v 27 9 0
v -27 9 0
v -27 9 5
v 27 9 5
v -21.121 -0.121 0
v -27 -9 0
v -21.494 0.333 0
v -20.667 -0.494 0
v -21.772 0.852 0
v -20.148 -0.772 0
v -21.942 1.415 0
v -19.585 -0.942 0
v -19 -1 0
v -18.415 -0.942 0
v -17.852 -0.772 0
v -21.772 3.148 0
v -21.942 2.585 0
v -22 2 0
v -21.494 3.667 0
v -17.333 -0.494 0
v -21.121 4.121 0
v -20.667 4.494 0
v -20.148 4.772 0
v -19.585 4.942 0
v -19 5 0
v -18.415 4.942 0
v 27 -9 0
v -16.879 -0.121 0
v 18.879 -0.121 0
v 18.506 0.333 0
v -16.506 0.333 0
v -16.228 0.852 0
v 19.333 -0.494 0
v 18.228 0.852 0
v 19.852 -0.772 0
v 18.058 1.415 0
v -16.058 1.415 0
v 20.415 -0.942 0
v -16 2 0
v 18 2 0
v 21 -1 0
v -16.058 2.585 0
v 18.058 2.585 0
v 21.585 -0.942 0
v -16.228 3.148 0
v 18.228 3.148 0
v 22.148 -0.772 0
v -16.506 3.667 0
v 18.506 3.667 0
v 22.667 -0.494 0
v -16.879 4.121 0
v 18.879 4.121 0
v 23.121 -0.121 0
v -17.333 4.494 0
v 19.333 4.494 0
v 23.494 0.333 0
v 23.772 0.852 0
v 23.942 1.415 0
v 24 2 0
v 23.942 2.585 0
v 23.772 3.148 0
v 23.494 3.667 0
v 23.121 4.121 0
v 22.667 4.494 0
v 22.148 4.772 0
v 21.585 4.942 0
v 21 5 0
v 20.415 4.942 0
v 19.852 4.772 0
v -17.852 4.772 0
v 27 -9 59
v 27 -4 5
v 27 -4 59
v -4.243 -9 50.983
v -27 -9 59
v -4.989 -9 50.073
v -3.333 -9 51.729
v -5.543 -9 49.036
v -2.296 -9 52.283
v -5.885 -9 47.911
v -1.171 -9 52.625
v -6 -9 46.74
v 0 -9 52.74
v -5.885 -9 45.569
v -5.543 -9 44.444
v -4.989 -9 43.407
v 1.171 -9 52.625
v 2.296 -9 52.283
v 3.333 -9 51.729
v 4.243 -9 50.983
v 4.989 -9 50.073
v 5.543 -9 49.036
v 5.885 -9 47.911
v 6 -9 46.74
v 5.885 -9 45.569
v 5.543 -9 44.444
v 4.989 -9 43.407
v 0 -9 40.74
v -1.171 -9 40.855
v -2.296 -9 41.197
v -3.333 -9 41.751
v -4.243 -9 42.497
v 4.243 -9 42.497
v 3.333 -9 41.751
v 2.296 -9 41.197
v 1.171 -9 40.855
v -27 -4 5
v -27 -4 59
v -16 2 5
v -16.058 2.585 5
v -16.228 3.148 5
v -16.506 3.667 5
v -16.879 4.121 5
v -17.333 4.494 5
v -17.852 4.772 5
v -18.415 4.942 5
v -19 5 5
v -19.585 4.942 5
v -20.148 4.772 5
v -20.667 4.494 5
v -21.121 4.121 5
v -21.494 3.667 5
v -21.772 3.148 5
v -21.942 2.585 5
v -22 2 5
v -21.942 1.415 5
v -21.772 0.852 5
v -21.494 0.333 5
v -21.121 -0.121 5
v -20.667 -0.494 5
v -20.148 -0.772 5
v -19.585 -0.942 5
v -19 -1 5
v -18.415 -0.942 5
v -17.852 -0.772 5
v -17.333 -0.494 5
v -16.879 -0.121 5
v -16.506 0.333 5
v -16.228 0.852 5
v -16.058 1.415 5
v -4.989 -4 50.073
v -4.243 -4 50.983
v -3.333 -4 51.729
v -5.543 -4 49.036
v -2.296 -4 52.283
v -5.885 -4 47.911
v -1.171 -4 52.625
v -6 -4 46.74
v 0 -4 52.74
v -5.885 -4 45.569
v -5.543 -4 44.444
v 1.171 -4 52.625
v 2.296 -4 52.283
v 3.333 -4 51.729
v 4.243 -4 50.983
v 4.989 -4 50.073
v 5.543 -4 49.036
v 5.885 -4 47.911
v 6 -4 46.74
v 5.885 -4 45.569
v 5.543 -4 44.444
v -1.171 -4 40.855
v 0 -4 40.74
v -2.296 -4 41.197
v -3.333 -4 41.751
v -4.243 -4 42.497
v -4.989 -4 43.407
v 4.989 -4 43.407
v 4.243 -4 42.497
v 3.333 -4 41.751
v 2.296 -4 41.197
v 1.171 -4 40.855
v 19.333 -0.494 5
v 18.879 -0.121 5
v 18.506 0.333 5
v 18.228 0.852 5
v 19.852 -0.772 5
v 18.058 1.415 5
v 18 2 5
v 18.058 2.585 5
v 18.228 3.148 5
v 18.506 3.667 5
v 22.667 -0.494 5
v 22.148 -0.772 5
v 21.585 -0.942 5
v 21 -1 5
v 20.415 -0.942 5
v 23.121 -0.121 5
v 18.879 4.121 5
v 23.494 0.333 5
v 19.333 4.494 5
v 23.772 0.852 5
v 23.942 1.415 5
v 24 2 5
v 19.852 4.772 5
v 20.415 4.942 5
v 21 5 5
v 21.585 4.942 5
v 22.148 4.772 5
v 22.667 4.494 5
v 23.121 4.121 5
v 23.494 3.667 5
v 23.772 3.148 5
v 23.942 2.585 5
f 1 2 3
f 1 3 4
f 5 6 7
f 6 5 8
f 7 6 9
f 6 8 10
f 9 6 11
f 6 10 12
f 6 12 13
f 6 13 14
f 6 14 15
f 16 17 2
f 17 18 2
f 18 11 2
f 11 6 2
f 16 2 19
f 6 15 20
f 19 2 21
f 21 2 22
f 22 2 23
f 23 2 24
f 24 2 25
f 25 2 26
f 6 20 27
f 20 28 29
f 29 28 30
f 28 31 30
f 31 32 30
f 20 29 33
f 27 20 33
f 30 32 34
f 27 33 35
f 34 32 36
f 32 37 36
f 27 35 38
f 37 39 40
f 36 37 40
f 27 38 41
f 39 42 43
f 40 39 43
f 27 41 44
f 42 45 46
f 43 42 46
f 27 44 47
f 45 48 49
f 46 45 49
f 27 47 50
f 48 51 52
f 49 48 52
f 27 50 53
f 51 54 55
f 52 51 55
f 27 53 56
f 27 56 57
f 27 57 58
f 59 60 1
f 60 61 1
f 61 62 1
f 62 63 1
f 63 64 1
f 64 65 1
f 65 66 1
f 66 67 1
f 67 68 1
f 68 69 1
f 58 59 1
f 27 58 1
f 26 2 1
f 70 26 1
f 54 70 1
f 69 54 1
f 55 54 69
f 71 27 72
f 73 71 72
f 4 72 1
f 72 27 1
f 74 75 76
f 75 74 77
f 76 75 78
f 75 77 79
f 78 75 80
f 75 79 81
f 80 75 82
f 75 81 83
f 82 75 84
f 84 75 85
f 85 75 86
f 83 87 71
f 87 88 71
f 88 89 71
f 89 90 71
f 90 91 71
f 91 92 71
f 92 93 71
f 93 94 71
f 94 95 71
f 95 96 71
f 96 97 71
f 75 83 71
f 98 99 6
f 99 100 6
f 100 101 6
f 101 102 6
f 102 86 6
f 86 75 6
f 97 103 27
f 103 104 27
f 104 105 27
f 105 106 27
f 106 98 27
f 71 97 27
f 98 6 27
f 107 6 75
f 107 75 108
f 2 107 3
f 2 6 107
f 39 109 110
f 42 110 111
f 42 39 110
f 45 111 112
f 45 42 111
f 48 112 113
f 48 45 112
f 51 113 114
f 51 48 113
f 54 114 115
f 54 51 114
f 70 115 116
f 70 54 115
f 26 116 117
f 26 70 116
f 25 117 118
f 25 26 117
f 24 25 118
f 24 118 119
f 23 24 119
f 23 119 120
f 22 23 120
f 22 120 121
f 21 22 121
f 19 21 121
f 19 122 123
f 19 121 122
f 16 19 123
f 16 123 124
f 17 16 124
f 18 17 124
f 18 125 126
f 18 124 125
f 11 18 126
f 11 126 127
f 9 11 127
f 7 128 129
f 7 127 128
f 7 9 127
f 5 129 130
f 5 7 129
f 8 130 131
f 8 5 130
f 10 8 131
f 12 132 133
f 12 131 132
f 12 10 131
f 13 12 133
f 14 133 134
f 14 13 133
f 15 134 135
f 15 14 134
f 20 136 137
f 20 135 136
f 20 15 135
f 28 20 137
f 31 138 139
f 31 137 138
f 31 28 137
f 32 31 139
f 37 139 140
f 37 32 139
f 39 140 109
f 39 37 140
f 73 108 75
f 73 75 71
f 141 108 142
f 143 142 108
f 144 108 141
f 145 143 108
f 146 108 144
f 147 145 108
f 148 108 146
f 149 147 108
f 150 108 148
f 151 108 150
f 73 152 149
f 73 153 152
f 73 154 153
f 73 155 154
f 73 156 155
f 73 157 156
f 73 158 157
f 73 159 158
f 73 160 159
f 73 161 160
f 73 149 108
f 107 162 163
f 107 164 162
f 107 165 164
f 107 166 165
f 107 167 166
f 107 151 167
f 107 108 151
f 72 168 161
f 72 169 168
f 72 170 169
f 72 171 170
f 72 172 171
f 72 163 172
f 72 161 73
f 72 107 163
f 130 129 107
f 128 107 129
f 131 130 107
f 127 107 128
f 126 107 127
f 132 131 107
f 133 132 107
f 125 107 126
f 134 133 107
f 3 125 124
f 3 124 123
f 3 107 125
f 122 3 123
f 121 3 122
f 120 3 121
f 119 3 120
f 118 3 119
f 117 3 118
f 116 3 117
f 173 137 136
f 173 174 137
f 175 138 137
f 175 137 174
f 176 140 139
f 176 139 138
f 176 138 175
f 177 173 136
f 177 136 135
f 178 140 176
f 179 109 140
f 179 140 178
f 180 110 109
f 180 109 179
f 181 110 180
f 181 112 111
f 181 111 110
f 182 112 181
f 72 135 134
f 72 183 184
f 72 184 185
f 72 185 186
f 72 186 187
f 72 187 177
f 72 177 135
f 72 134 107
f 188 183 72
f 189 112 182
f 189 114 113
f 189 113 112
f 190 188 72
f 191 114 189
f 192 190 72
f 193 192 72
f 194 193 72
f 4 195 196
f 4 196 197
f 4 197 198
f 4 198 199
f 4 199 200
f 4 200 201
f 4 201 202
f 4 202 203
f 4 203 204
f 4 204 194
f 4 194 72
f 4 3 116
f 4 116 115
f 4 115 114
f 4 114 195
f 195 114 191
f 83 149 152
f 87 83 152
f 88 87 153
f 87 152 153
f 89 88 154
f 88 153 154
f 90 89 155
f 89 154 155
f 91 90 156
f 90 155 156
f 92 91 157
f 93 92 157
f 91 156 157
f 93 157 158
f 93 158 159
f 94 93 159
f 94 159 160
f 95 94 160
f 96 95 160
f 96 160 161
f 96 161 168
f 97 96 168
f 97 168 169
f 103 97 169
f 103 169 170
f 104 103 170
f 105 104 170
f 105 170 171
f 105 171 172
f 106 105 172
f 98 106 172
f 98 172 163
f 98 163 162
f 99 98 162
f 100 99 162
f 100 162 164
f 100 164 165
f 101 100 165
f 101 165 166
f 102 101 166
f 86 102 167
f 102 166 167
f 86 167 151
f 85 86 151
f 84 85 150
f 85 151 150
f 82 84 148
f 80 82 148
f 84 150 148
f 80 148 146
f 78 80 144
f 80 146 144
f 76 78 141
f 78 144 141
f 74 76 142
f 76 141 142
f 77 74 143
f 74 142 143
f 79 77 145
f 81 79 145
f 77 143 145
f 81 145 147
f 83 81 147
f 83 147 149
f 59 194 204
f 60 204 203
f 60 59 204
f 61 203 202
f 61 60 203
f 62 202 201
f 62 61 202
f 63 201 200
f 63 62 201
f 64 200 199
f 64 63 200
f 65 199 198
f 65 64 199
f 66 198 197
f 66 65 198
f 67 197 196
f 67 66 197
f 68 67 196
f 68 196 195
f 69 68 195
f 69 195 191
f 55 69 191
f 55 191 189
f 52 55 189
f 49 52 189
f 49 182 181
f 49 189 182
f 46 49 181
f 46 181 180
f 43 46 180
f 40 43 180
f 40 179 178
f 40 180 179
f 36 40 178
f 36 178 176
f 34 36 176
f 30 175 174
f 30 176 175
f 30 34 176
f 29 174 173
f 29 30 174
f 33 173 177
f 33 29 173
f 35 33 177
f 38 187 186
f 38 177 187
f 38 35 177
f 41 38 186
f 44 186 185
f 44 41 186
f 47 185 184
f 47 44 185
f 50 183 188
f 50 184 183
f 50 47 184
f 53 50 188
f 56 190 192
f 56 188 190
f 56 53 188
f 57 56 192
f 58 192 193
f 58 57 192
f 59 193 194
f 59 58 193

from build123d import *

# Parameters (mm, degrees)
ESQUISSE1_W             = 54
ESQUISSE1_H             = 18
ESQUISSE1_R             = 3
BOSS_EXTRU_1_DEPTH      = 59
ESQUISSE2_W             = 89.885876072
ESQUISSE2_H             = 74.564815434
ENL_V_MAT_EXTRU_1_DEPTH = 13
ESQUISSE3_R             = 6
ENL_V_MAT_EXTRU_2_DEPTH = 13


with BuildPart() as part:
    # Esquisse1 → Boss.-Extru.1 (new body)
    with BuildSketch(Plane.XY):
        Rectangle(ESQUISSE1_W, ESQUISSE1_H)
        with Locations((-19, 2)):
            Circle(ESQUISSE1_R, mode=Mode.SUBTRACT)
        with Locations((21, 2)):
            Circle(ESQUISSE1_R, mode=Mode.SUBTRACT)
    extrude(amount=BOSS_EXTRU_1_DEPTH)

    # Esquisse2 → Enlèv. mat.-Extru.1 (cut)
    with BuildSketch(Plane(origin=(0, 9, 0), x_dir=(1, 0, 0), z_dir=(0, 1, 0))):
        with Locations((-2.437014962, -42.282407717)):
            Rectangle(ESQUISSE2_W, ESQUISSE2_H)
    extrude(amount=-ENL_V_MAT_EXTRU_1_DEPTH, mode=Mode.SUBTRACT)

    # Esquisse3 → Enlèv. mat.-Extru.2 (cut)
    with BuildSketch(Plane(origin=(0, -4, 0), x_dir=(1, 0, 0), z_dir=(0, 1, 0))):
        with Locations(Location((0, -46.74, 0), (0, 0, 270))):
            Circle(ESQUISSE3_R)
    extrude(amount=-ENL_V_MAT_EXTRU_2_DEPTH, mode=Mode.SUBTRACT)


solid = part.part
